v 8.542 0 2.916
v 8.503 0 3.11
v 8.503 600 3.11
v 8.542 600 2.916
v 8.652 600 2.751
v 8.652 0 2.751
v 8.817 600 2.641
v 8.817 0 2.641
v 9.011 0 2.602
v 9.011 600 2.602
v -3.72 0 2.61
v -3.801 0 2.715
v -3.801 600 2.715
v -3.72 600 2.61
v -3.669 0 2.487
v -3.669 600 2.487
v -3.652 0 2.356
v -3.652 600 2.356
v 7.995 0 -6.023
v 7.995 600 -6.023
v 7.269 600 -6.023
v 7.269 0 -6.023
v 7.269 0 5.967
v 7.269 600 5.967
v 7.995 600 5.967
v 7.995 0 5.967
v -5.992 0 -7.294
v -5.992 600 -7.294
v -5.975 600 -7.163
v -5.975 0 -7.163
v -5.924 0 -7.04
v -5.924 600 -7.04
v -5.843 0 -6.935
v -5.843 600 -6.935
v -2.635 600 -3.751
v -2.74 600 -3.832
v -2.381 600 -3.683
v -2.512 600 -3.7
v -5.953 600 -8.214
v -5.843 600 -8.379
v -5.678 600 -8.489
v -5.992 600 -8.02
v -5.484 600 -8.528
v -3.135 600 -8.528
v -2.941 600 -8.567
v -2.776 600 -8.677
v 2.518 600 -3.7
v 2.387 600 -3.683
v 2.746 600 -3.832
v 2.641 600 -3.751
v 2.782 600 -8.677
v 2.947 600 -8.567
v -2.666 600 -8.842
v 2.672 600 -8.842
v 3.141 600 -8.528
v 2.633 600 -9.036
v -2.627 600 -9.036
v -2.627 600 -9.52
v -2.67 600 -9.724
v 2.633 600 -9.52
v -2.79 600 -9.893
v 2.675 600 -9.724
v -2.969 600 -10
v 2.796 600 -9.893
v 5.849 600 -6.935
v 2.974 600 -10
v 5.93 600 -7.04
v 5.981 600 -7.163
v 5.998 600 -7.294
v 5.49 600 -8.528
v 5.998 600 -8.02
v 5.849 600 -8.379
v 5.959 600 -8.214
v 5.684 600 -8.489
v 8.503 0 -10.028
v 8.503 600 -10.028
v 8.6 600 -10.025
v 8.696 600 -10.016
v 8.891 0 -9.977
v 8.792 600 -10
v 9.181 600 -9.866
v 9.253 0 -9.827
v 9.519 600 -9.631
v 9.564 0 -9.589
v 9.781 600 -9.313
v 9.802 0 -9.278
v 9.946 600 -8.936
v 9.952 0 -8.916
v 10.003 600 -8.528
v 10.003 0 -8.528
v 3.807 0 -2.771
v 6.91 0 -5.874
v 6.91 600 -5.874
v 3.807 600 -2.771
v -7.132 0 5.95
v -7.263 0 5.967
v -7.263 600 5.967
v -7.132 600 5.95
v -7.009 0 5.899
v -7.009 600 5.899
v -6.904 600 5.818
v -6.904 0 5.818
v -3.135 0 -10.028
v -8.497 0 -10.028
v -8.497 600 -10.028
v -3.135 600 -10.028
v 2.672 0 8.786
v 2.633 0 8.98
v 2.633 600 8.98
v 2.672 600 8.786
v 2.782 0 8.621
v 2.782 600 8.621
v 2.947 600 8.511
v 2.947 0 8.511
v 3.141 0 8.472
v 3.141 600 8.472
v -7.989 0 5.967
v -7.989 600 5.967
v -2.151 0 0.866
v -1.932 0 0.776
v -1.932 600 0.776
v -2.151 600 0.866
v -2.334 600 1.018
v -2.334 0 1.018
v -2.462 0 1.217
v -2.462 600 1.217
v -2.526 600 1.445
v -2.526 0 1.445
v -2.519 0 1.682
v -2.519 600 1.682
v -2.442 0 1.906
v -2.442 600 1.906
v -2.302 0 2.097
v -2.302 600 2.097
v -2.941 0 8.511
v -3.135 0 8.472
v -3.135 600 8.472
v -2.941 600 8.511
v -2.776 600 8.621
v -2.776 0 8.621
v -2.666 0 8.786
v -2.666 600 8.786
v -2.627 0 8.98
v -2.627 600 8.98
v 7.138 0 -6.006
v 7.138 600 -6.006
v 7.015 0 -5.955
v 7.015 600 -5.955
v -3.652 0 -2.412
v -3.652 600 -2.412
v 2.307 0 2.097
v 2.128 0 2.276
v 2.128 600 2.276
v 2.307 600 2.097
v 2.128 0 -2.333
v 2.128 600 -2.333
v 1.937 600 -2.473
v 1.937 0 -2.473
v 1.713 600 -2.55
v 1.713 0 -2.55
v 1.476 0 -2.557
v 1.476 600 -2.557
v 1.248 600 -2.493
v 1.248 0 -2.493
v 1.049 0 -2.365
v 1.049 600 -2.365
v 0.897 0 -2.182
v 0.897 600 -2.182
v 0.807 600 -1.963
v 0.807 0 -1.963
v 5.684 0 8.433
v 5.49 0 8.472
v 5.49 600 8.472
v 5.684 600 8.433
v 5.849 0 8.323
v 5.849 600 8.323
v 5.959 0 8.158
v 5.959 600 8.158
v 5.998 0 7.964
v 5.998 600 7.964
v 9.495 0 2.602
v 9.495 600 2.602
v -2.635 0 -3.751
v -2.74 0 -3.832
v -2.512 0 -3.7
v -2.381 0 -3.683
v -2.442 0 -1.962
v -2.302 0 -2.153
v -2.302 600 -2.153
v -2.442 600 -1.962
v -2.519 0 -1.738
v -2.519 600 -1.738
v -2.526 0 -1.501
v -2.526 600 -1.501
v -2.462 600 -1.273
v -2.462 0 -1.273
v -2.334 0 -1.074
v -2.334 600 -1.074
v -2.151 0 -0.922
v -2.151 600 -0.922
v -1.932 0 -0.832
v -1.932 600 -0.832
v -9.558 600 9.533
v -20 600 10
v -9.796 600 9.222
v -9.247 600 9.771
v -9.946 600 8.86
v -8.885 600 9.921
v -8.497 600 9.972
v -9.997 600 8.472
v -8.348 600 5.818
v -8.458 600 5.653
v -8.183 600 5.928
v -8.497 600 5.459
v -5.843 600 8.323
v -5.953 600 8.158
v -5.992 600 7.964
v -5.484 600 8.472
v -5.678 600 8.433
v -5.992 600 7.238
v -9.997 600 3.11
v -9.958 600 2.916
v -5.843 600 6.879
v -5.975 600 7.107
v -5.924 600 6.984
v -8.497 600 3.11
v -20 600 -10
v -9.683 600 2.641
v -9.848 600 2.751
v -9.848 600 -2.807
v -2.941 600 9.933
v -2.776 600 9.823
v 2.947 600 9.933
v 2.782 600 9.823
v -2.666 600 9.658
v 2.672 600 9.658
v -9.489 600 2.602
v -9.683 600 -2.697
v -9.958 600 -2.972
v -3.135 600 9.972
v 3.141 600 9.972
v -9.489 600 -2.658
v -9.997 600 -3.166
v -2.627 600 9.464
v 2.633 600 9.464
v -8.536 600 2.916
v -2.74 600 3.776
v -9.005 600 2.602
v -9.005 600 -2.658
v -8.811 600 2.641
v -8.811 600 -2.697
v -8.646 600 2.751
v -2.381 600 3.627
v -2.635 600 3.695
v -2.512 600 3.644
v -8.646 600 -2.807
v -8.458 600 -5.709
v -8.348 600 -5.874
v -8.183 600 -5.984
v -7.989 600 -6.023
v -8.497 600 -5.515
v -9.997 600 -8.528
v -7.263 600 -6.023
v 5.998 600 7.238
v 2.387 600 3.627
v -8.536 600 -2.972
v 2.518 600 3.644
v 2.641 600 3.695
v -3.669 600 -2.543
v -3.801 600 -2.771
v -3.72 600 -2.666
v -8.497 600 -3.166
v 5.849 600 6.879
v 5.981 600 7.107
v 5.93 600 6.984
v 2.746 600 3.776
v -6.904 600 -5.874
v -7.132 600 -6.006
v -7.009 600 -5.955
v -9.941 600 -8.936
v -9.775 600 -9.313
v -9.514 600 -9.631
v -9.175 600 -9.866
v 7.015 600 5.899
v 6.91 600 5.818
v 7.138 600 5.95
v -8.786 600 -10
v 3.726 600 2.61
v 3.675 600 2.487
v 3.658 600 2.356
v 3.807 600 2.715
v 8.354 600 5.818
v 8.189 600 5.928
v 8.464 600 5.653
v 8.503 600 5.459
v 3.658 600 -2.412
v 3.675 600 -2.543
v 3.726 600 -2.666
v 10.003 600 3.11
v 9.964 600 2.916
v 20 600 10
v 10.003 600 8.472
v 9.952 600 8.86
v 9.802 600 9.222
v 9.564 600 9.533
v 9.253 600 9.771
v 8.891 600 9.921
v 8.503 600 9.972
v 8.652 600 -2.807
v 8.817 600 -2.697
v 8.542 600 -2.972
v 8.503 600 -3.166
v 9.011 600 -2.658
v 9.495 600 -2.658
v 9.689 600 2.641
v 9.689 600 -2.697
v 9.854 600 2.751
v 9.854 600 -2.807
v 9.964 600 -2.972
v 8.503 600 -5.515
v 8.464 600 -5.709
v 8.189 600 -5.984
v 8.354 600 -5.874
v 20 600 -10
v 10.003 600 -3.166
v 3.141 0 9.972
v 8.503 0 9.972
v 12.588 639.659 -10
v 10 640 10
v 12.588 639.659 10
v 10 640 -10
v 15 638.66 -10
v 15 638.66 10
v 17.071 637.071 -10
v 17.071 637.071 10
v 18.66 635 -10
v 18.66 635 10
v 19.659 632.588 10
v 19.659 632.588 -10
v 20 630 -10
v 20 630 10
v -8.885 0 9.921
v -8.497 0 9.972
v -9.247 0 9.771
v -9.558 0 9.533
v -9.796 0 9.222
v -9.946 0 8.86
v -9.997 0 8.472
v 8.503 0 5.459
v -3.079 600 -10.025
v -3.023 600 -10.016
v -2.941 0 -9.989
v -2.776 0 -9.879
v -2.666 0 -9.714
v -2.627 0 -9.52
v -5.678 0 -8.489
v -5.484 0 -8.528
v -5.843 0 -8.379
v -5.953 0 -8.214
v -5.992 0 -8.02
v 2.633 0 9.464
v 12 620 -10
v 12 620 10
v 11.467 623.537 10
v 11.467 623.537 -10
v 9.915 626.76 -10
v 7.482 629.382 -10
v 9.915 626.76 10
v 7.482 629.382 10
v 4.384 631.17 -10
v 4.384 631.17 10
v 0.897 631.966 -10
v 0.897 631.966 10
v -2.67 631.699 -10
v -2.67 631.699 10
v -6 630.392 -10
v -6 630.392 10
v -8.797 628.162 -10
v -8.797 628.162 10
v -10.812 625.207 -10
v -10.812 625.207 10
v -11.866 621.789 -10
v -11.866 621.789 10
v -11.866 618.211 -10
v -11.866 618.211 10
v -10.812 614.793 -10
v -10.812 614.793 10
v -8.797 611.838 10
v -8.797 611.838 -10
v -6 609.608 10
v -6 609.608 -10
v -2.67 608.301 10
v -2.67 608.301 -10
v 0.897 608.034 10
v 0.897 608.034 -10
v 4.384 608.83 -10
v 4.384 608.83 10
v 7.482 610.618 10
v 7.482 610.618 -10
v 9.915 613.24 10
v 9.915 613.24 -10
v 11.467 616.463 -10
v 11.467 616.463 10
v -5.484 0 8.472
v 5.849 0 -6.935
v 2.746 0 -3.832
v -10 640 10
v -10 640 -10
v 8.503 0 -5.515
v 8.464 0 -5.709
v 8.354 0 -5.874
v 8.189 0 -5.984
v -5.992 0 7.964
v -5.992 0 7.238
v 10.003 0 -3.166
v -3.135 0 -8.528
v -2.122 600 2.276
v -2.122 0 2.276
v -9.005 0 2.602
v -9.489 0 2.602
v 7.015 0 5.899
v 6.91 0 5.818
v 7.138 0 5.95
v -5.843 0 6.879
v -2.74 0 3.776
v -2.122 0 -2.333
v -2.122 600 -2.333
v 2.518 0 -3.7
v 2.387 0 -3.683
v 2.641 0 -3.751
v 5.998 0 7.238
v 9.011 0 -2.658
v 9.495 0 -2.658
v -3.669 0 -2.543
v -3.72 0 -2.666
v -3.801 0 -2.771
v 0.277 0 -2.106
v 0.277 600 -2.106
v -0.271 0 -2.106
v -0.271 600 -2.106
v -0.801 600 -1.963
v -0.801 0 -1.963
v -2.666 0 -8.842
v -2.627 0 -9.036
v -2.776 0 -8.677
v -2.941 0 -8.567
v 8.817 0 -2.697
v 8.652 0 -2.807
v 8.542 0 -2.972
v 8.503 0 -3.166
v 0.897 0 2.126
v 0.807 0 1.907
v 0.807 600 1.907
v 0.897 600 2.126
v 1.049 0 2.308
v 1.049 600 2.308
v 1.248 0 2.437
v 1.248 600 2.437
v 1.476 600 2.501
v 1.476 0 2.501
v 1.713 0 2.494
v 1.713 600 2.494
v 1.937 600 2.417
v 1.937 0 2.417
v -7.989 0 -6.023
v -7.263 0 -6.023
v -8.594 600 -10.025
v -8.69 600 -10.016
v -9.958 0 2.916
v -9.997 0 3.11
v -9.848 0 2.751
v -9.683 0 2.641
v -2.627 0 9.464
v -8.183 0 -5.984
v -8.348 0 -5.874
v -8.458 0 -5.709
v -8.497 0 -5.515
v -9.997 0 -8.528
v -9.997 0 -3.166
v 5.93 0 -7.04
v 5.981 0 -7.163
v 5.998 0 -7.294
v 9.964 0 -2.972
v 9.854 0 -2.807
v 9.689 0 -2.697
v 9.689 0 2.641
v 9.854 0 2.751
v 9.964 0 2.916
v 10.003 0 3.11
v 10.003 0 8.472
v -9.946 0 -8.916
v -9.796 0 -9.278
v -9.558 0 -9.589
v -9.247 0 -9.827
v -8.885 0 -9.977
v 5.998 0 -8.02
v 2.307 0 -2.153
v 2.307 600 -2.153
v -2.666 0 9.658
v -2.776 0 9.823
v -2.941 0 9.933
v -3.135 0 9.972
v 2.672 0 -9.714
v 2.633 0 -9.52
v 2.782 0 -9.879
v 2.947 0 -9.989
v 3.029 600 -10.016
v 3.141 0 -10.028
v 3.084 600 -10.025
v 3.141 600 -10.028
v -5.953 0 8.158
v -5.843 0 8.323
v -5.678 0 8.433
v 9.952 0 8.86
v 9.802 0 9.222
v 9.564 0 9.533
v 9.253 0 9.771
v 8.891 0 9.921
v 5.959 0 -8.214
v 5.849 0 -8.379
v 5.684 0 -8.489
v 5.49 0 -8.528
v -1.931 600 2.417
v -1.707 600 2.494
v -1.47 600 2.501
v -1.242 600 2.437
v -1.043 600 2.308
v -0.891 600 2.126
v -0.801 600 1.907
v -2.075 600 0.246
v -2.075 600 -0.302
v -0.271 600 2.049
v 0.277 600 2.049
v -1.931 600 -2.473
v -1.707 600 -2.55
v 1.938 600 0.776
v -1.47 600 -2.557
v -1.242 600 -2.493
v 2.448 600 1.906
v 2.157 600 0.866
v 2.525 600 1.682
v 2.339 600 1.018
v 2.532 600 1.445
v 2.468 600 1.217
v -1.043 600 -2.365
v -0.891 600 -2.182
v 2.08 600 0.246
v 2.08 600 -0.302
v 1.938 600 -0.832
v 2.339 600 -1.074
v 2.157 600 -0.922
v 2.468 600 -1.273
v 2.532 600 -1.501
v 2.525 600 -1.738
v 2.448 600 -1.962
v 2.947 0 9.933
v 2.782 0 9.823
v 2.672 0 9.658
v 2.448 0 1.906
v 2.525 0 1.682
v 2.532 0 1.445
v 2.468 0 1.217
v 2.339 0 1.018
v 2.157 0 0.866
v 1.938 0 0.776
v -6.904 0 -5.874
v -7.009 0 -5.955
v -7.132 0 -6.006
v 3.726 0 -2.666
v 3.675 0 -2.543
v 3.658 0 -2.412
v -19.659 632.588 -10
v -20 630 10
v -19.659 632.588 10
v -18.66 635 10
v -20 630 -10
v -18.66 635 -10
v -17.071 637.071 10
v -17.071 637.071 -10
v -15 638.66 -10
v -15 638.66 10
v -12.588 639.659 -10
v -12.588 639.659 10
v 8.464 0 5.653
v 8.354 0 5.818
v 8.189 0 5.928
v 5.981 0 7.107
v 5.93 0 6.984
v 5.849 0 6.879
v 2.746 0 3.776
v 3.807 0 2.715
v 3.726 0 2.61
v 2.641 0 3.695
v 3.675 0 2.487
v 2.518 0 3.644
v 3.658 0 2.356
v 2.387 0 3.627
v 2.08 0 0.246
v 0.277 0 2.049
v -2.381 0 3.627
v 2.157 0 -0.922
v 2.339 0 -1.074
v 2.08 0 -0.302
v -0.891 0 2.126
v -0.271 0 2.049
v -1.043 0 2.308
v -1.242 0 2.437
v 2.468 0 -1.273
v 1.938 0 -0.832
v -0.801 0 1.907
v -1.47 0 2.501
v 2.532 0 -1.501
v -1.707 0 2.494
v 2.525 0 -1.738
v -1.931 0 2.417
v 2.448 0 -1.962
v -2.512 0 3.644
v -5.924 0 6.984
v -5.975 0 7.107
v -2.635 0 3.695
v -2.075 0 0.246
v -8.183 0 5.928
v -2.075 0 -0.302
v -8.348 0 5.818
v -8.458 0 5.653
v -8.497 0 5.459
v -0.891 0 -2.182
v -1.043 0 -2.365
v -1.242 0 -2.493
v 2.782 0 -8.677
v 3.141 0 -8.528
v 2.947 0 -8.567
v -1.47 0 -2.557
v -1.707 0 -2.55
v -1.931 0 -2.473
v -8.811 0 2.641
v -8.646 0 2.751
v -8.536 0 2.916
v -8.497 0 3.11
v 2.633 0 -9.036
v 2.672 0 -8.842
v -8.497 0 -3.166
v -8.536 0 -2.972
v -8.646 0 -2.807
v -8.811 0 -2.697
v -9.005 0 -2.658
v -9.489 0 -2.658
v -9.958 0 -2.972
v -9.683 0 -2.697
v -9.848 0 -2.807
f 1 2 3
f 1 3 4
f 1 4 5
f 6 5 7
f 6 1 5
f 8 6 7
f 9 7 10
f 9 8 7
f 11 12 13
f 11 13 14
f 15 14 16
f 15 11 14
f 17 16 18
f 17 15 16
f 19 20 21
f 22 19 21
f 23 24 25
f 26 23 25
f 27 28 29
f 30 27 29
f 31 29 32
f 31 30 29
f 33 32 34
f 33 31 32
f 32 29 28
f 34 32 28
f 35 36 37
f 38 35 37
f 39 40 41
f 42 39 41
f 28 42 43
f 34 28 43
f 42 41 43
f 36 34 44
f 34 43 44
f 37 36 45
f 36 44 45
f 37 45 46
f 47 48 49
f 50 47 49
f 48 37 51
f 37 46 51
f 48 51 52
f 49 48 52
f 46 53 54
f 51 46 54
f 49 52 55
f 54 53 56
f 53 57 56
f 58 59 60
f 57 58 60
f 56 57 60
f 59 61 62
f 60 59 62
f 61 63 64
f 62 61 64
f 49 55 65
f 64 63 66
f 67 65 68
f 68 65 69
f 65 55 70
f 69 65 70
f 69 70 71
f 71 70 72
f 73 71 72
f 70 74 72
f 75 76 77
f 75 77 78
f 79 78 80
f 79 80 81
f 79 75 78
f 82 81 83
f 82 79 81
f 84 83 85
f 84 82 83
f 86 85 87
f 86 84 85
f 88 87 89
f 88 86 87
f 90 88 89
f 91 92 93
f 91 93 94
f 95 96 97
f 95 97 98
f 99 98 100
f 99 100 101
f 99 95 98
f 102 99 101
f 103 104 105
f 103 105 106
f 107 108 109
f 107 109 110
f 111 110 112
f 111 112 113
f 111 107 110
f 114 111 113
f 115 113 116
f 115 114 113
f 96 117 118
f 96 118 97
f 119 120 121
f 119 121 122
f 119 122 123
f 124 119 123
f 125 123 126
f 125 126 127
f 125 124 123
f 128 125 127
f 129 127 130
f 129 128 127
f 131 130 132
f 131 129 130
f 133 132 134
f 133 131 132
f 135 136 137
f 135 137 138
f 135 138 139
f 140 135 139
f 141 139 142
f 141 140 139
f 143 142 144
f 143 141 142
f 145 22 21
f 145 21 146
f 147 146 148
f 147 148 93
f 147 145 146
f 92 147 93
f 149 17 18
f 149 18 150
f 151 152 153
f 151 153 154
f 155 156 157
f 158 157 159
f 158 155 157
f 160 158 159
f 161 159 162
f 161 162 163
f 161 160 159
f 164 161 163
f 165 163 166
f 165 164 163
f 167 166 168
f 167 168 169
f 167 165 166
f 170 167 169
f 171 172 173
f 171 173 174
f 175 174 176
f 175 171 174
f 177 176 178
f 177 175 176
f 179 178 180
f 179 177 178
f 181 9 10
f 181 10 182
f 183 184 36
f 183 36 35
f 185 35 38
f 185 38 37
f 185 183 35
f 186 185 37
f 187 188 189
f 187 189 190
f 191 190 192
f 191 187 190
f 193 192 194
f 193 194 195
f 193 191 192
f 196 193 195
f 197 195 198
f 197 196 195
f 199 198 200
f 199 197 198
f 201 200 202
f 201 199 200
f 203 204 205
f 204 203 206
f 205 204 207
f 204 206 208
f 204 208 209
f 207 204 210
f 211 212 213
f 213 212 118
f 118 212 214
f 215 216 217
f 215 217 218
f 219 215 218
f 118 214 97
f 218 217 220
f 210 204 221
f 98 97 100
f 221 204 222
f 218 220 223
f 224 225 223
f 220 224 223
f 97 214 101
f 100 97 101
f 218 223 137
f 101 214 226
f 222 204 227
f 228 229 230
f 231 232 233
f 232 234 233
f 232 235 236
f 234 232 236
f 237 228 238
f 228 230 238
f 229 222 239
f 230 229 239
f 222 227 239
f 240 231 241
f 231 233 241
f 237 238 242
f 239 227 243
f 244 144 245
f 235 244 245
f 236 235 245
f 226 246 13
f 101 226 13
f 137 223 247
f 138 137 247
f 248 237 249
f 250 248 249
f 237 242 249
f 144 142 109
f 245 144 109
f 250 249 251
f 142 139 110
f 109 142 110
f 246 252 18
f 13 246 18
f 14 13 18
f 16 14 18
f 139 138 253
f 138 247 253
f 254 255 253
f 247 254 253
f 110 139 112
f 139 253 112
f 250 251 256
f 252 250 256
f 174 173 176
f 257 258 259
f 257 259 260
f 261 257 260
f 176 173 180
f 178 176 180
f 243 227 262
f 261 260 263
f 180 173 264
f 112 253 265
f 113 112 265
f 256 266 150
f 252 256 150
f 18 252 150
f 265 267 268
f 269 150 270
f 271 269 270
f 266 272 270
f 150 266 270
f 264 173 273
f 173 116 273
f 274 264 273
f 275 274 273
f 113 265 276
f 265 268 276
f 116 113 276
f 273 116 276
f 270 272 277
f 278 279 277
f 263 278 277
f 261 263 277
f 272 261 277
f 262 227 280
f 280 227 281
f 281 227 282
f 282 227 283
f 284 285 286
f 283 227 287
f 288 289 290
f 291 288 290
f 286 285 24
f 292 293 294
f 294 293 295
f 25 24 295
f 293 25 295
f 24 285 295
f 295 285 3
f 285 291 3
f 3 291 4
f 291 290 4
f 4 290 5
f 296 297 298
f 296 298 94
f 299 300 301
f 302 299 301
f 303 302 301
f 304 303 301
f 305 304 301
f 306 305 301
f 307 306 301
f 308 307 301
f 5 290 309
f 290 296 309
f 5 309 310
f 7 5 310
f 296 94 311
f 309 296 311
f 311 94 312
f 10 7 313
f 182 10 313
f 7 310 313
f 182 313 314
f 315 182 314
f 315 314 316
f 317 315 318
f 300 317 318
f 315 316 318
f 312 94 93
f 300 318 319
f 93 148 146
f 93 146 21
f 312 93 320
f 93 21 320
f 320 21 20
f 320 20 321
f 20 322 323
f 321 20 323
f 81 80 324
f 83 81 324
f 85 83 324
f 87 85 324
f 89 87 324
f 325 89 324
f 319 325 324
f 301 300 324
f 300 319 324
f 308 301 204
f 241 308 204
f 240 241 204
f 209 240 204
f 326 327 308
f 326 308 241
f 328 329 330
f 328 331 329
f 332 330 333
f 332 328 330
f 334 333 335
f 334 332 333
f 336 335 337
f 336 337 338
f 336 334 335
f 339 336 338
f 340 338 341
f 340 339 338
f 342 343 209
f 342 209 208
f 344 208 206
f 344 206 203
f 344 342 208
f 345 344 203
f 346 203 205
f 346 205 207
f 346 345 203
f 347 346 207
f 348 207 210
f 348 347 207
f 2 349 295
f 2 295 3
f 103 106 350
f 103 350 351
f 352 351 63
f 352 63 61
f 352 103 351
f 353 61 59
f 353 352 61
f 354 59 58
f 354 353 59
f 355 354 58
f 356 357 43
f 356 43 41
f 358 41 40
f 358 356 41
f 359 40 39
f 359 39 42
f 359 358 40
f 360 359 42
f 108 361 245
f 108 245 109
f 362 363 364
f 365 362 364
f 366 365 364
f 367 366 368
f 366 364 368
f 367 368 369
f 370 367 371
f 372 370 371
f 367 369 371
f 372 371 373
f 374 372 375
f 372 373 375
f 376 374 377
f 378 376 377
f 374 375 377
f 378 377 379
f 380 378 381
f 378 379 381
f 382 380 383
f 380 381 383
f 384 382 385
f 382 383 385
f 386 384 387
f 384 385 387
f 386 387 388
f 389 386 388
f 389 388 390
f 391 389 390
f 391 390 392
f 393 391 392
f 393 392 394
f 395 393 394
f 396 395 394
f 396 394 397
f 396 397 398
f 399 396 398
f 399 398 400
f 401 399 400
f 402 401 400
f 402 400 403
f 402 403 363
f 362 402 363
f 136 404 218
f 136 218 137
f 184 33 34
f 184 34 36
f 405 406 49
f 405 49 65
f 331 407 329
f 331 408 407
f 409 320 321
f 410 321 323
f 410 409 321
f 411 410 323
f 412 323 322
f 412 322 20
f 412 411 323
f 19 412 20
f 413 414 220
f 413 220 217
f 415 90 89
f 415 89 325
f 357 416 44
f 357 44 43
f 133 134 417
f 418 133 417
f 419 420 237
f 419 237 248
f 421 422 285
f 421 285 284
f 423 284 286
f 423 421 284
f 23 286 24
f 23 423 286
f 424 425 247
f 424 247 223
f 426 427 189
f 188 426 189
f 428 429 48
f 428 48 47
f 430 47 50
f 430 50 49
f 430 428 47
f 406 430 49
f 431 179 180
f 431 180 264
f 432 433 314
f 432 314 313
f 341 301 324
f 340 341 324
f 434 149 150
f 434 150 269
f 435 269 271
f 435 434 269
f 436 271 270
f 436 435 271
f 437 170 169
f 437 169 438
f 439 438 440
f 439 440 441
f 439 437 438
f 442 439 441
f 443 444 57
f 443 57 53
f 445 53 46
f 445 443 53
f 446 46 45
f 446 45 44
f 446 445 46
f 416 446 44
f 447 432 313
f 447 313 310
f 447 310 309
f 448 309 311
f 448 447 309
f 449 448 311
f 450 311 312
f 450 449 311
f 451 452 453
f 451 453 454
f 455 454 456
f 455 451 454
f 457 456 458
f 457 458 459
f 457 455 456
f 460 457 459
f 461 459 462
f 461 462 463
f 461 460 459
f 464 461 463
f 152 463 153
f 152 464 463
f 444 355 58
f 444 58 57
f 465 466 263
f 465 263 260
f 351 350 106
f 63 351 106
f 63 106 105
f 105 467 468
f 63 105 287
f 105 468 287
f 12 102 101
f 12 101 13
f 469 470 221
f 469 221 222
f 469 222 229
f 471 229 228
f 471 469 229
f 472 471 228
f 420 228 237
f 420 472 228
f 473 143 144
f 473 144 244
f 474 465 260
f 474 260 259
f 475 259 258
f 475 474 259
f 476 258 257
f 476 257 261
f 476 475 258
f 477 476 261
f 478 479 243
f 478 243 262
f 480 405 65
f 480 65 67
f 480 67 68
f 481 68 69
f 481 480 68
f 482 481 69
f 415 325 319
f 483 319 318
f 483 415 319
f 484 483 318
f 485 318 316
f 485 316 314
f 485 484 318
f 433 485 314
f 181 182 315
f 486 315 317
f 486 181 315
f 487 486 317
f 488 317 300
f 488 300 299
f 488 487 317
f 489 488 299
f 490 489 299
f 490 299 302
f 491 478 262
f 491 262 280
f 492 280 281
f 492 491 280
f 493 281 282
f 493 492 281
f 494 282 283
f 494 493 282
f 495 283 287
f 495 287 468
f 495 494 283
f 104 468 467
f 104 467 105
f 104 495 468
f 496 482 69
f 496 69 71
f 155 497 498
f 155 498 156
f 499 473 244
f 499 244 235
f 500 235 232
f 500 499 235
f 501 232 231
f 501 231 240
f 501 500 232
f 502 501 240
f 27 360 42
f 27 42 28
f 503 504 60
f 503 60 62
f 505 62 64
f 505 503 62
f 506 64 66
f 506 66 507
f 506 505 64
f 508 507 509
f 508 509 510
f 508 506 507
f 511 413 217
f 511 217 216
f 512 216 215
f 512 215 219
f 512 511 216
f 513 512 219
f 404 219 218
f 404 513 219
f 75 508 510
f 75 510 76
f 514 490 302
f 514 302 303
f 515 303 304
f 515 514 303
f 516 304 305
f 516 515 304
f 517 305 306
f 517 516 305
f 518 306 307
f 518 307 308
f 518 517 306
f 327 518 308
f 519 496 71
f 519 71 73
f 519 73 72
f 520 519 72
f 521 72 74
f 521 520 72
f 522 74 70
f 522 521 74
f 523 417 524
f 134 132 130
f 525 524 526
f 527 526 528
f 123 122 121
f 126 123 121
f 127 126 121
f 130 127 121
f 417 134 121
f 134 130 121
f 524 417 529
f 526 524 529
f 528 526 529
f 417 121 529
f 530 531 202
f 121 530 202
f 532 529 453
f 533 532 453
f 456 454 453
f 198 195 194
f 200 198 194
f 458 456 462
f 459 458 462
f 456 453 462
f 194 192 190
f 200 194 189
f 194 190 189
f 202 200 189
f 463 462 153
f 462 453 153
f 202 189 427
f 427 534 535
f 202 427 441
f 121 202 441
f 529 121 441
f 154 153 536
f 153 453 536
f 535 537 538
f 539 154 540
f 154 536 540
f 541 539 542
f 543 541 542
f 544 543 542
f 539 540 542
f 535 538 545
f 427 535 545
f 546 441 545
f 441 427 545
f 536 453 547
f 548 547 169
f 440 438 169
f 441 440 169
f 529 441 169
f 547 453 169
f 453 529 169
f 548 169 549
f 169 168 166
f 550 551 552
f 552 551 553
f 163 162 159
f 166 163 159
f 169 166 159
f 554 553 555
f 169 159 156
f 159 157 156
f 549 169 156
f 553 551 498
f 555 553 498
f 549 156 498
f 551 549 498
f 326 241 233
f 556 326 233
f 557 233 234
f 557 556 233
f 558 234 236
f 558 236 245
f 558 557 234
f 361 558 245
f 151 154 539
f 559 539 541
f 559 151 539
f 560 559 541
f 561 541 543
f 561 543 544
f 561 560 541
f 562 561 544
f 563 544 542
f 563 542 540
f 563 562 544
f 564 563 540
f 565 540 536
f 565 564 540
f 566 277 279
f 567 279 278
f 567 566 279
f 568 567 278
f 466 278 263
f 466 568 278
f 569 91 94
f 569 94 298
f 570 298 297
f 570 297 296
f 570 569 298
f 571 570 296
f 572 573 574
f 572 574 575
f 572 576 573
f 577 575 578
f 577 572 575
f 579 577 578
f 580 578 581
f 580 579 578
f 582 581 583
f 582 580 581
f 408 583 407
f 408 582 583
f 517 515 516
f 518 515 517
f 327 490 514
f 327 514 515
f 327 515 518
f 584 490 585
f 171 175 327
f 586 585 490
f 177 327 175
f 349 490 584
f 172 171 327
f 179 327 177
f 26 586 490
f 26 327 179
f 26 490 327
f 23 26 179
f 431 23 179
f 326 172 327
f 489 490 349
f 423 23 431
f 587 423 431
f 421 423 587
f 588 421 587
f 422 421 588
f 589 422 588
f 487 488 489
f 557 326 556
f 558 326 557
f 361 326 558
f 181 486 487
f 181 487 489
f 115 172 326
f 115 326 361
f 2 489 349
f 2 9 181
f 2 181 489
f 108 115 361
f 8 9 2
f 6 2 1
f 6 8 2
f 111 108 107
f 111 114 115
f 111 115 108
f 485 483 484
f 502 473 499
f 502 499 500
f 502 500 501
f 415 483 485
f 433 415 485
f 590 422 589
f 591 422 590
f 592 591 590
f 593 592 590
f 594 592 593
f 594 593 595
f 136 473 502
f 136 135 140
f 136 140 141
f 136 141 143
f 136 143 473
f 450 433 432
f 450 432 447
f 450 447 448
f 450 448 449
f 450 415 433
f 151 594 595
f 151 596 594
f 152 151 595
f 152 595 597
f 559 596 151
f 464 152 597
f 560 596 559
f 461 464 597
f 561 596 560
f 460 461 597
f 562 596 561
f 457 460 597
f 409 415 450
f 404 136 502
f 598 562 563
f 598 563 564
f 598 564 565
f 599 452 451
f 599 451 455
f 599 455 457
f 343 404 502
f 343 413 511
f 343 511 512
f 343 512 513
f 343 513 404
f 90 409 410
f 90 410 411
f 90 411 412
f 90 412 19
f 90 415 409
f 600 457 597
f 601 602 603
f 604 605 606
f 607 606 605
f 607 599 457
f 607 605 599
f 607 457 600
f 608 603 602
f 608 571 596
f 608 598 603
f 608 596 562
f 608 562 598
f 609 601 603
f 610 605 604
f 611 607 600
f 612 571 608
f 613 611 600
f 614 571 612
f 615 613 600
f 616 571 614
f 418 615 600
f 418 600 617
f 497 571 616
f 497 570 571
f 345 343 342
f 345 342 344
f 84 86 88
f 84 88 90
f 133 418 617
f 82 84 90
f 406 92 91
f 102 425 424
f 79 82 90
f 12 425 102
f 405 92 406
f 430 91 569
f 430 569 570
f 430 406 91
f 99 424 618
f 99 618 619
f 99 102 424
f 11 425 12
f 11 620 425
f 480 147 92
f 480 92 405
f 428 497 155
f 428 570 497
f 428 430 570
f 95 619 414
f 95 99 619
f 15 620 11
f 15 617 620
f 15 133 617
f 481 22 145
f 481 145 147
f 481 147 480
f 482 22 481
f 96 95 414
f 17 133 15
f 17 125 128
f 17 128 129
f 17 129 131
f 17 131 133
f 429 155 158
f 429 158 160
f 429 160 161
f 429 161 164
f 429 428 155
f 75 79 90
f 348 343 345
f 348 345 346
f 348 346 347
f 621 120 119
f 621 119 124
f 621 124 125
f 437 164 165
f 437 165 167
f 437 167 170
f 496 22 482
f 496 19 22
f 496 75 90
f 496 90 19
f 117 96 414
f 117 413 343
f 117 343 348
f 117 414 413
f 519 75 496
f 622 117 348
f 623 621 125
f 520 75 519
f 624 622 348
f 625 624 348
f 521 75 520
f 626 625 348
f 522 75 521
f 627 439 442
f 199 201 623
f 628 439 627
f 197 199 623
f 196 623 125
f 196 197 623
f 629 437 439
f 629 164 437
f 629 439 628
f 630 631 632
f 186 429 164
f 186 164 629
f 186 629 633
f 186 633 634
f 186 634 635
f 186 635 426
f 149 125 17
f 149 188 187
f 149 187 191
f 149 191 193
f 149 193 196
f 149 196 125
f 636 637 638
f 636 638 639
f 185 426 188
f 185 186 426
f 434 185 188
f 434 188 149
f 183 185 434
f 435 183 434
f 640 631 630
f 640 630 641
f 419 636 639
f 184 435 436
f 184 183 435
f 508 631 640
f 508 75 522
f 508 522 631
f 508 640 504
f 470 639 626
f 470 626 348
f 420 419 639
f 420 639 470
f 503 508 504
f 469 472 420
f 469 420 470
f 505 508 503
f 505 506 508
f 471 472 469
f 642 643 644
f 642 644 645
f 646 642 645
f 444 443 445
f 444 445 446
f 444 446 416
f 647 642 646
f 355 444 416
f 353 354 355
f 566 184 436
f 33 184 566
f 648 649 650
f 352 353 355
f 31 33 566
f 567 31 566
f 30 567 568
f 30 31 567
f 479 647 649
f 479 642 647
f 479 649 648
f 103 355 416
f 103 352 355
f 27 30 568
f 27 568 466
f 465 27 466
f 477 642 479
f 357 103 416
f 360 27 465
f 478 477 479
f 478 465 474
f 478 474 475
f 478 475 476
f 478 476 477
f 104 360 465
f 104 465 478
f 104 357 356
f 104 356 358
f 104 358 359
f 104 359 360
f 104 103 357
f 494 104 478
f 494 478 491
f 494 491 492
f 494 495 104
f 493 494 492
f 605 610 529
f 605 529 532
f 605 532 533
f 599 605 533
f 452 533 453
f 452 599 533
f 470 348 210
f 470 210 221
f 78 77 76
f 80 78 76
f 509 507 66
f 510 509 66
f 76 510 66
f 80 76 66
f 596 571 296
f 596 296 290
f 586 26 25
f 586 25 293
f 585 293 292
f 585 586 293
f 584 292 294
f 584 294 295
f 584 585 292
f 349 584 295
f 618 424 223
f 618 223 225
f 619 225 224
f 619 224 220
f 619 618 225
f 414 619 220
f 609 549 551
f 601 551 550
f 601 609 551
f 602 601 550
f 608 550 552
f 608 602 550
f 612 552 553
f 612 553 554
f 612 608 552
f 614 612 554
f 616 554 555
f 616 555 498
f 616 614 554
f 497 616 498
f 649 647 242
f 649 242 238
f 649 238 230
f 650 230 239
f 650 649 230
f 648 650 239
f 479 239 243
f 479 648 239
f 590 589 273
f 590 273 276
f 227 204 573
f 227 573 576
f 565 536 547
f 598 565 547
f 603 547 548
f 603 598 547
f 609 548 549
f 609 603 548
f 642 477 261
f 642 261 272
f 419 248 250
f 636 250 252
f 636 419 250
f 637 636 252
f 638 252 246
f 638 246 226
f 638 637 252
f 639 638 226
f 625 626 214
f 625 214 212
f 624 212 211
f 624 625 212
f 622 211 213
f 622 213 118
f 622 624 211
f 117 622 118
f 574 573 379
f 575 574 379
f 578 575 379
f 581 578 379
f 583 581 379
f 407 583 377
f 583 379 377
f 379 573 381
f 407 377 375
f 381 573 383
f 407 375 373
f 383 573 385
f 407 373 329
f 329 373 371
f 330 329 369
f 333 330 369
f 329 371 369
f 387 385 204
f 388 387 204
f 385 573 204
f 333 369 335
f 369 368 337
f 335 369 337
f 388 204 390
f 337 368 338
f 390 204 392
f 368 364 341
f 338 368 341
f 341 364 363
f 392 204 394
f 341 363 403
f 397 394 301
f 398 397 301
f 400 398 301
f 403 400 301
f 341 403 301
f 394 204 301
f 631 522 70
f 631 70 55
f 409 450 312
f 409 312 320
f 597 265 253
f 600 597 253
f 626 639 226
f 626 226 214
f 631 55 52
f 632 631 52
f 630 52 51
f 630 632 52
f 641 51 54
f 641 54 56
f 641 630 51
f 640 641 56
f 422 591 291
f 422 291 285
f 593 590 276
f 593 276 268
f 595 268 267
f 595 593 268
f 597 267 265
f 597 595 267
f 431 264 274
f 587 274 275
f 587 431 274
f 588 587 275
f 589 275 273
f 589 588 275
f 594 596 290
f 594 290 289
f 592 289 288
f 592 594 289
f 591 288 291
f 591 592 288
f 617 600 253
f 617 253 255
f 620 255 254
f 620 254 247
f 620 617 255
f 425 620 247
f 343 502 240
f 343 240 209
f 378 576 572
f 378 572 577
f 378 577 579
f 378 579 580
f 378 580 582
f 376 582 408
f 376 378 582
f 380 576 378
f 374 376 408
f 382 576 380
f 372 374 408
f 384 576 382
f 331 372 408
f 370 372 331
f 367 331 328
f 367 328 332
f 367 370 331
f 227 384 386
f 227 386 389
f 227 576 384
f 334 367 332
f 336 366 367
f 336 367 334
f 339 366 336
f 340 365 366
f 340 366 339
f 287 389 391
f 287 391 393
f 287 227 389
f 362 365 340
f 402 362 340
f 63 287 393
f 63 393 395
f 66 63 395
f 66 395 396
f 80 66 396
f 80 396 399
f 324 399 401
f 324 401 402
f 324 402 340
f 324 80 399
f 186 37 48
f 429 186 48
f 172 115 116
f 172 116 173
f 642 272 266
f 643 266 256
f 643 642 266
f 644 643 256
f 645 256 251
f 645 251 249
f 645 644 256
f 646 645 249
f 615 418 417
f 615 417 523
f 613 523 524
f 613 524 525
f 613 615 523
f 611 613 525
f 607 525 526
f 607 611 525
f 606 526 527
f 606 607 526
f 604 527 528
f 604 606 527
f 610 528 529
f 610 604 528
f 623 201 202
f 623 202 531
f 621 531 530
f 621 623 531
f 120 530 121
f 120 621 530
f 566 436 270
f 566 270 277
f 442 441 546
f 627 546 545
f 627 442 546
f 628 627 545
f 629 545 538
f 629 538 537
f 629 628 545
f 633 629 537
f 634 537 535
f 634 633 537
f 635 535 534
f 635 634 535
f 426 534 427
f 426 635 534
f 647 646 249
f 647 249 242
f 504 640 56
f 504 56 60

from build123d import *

# Parameters (mm, degrees)
BOSS_EXTRUDE1_DEPTH = 600
SKETCH2_W           = 40
SKETCH2_H           = 20
BOSS_EXTRUDE2_DEPTH = 40
FILLET1_R           = 10
SKETCH3_R           = 12
CUT_EXTRUDE1_DEPTH  = 40


with BuildPart() as part:
    # Sketch1 → Boss-Extrude1 (new body)
    with BuildSketch(Plane(origin=(0, 0, 0), x_dir=(1, 0, 0), z_dir=(0, 1, 0))):
        with BuildLine():
            Line((9.494919477, 2.658080263), (9.010919477, 2.658080263))
            ThreePointArc((9.010919477, 2.658080263), (8.651709233, 2.806870018), (8.502919477, 3.166080263))
            Line((8.502919477, 3.166080263), (8.502919477, 5.515080263))
            ThreePointArc((8.502919477, 5.515080263), (8.354129722, 5.874290508), (7.994919477, 6.023080263))
            Line((7.994919477, 6.023080263), (7.269000139, 6.023080263))
            ThreePointArc((7.269000139, 6.023080263), (7.074596955, 5.984411065), (6.909789894, 5.874290508))
            Line((6.909789894, 5.874290508), (3.806709233, 2.771209846))
            ThreePointArc((3.806709233, 2.771209846), (3.696588675, 2.606402785), (3.657919477, 2.411999602))
            Line((3.657919477, 2.411999602), (3.657919477, -2.355839076))
            ThreePointArc((3.657919477, -2.355839076), (3.696588675, -2.550242259), (3.806709233, -2.71504932))
            Line((3.806709233, -2.71504932), (6.909789894, -5.818129982))
            ThreePointArc((6.909789894, -5.818129982), (7.074596955, -5.92825054), (7.269000139, -5.966919737))
            Line((7.269000139, -5.966919737), (7.994919477, -5.966919737))
            ThreePointArc((7.994919477, -5.966919737), (8.354129722, -5.818129982), (8.502919477, -5.458919737))
            Line((8.502919477, -5.458919737), (8.502919477, -3.109919737))
            ThreePointArc((8.502919477, -3.109919737), (8.651709233, -2.750709492), (9.010919477, -2.601919737))
            Line((9.010919477, -2.601919737), (9.494919477, -2.601919737))
            ThreePointArc((9.494919477, -2.601919737), (9.854129722, -2.750709492), (10.002919477, -3.109919737))
            Line((10.002919477, -3.109919737), (10.002919477, -8.471919737))
            ThreePointArc((10.002919477, -8.471919737), (9.563579649, -9.532579909), (8.502919477, -9.971919737))
            Line((8.502919477, -9.971919737), (3.140919477, -9.971919737))
            ThreePointArc((3.140919477, -9.971919737), (2.781709233, -9.823129982), (2.632919477, -9.463919737))
            Line((2.632919477, -9.463919737), (2.632919477, -8.979919737))
            ThreePointArc((2.632919477, -8.979919737), (2.781709233, -8.620709492), (3.140919477, -8.471919737))
            Line((3.140919477, -8.471919737), (5.489919477, -8.471919737))
            ThreePointArc((5.489919477, -8.471919737), (5.849129722, -8.323129982), (5.997919477, -7.963919737))
            Line((5.997919477, -7.963919737), (5.997919477, -7.238000398))
            ThreePointArc((5.997919477, -7.238000398), (5.95925028, -7.043597215), (5.849129722, -6.878790154))
            Line((5.849129722, -6.878790154), (2.746049061, -3.775709492))
            ThreePointArc((2.746049061, -3.775709492), (2.581242, -3.665588935), (2.386838816, -3.626919737))
            Line((2.386838816, -3.626919737), (-2.380999861, -3.626919737))
            ThreePointArc((-2.380999861, -3.626919737), (-2.575403045, -3.665588935), (-2.740210106, -3.775709492))
            Line((-2.740210106, -3.775709492), (-5.843290767, -6.878790154))
            ThreePointArc((-5.843290767, -6.878790154), (-5.953411325, -7.043597215), (-5.992080523, -7.238000398))
            Line((-5.992080523, -7.238000398), (-5.992080523, -7.963919737))
            ThreePointArc((-5.992080523, -7.963919737), (-5.843290767, -8.323129982), (-5.484080523, -8.471919737))
            Line((-5.484080523, -8.471919737), (-3.135080523, -8.471919737))
            ThreePointArc((-3.135080523, -8.471919737), (-2.775870278, -8.620709492), (-2.627080523, -8.979919737))
            Line((-2.627080523, -8.979919737), (-2.627080523, -9.463919737))
            ThreePointArc((-2.627080523, -9.463919737), (-2.775870278, -9.823129982), (-3.135080523, -9.971919737))
            Line((-3.135080523, -9.971919737), (-8.497080523, -9.971919737))
            ThreePointArc((-8.497080523, -9.971919737), (-9.557740694, -9.532579909), (-9.997080523, -8.471919737))
            Line((-9.997080523, -8.471919737), (-9.997080523, -3.109919737))
            ThreePointArc((-9.997080523, -3.109919737), (-9.848290767, -2.750709492), (-9.489080523, -2.601919737))
            Line((-9.489080523, -2.601919737), (-9.005080523, -2.601919737))
            ThreePointArc((-9.005080523, -2.601919737), (-8.645870278, -2.750709492), (-8.497080523, -3.109919737))
            Line((-8.497080523, -3.109919737), (-8.497080523, -5.458919737))
            ThreePointArc((-8.497080523, -5.458919737), (-8.348290767, -5.818129982), (-7.989080523, -5.966919737))
            Line((-7.989080523, -5.966919737), (-7.263161184, -5.966919737))
            ThreePointArc((-7.263161184, -5.966919737), (-7.068758, -5.92825054), (-6.903950939, -5.818129982))
            Line((-6.903950939, -5.818129982), (-3.800870278, -2.71504932))
            ThreePointArc((-3.800870278, -2.71504932), (-3.69074972, -2.550242259), (-3.652080523, -2.355839076))
            Line((-3.652080523, -2.355839076), (-3.652080523, 2.411999602))
            ThreePointArc((-3.652080523, 2.411999602), (-3.69074972, 2.606402785), (-3.800870278, 2.771209846))
            Line((-3.800870278, 2.771209846), (-6.903950939, 5.874290508))
            ThreePointArc((-6.903950939, 5.874290508), (-7.068758, 5.984411065), (-7.263161184, 6.023080263))
            Line((-7.263161184, 6.023080263), (-7.989080523, 6.023080263))
            ThreePointArc((-7.989080523, 6.023080263), (-8.348290767, 5.874290508), (-8.497080523, 5.515080263))
            Line((-8.497080523, 5.515080263), (-8.497080523, 3.166080263))
            ThreePointArc((-8.497080523, 3.166080263), (-8.645870278, 2.806870018), (-9.005080523, 2.658080263))
            Line((-9.005080523, 2.658080263), (-9.489080523, 2.658080263))
            ThreePointArc((-9.489080523, 2.658080263), (-9.848290767, 2.806870018), (-9.997080523, 3.166080263))
            Line((-9.997080523, 3.166080263), (-9.997080523, 8.528080263))
            ThreePointArc((-9.997080523, 8.528080263), (-9.557740694, 9.588740435), (-8.497080523, 10.028080263))
            Line((-8.497080523, 10.028080263), (-3.135080523, 10.028080263))
            ThreePointArc((-3.135080523, 10.028080263), (-2.775870278, 9.879290508), (-2.627080523, 9.520080263))
            Line((-2.627080523, 9.520080263), (-2.627080523, 9.036080263))
            ThreePointArc((-2.627080523, 9.036080263), (-2.775870278, 8.676870018), (-3.135080523, 8.528080263))
            Line((-3.135080523, 8.528080263), (-5.484080523, 8.528080263))
            ThreePointArc((-5.484080523, 8.528080263), (-5.843290767, 8.379290508), (-5.992080523, 8.020080263))
            Line((-5.992080523, 8.020080263), (-5.992080523, 7.294160924))
            ThreePointArc((-5.992080523, 7.294160924), (-5.953411325, 7.099757741), (-5.843290767, 6.93495068))
            Line((-5.843290767, 6.93495068), (-2.740210106, 3.831870018))
            ThreePointArc((-2.740210106, 3.831870018), (-2.575403045, 3.72174946), (-2.380999861, 3.683080263))
            Line((-2.380999861, 3.683080263), (2.386838816, 3.683080263))
            ThreePointArc((2.386838816, 3.683080263), (2.581242, 3.72174946), (2.746049061, 3.831870018))
            Line((2.746049061, 3.831870018), (5.849129722, 6.93495068))
            ThreePointArc((5.849129722, 6.93495068), (5.95925028, 7.099757741), (5.997919477, 7.294160924))
            Line((5.997919477, 7.294160924), (5.997919477, 8.020080263))
            ThreePointArc((5.997919477, 8.020080263), (5.849129722, 8.379290508), (5.489919477, 8.528080263))
            Line((5.489919477, 8.528080263), (3.140919477, 8.528080263))
            ThreePointArc((3.140919477, 8.528080263), (2.781709233, 8.676870018), (2.632919477, 9.036080263))
            Line((2.632919477, 9.036080263), (2.632919477, 9.520080263))
            ThreePointArc((2.632919477, 9.520080263), (2.781709233, 9.879290508), (3.140919477, 10.028080263))
            Line((3.140919477, 10.028080263), (8.502919477, 10.028080263))
            ThreePointArc((8.502919477, 10.028080263), (9.563579649, 9.588740435), (10.002919477, 8.528080263))
            Line((10.002919477, 8.528080263), (10.002919477, 3.166080263))
            ThreePointArc((10.002919477, 3.166080263), (9.854129722, 2.806870018), (9.494919477, 2.658080263))
        make_face()
        with BuildLine():
            Line((2.127820321, -2.276425703), (2.307425444, -2.096820581))
            ThreePointArc((2.307425444, -2.096820581), (2.508857494, -1.328387548), (1.938052984, -0.775896455))
            ThreePointArc((1.938052984, -0.775896455), (2.098419477, 0.028080263), (1.938052984, 0.832056981))
            ThreePointArc((1.938052984, 0.832056981), (2.508857494, 1.384548074), (2.307425444, 2.152981107))
            Line((2.307425444, 2.152981107), (2.127820321, 2.332586229))
            ThreePointArc((2.127820321, 2.332586229), (1.359387288, 2.53401828), (0.806896195, 1.963213769))
            ThreePointArc((0.806896195, 1.963213769), (0.002919477, 2.123580263), (-0.801057241, 1.963213769))
            ThreePointArc((-0.801057241, 1.963213769), (-1.353548333, 2.53401828), (-2.121981366, 2.332586229))
            Line((-2.121981366, 2.332586229), (-2.301586489, 2.152981107))
            ThreePointArc((-2.301586489, 2.152981107), (-2.503018539, 1.384548074), (-1.932214029, 0.832056981))
            ThreePointArc((-1.932214029, 0.832056981), (-2.092580523, 0.028080263), (-1.932214029, -0.775896455))
            ThreePointArc((-1.932214029, -0.775896455), (-2.503018539, -1.328387548), (-2.301586489, -2.096820581))
            Line((-2.301586489, -2.096820581), (-2.121981366, -2.276425703))
            ThreePointArc((-2.121981366, -2.276425703), (-1.353548333, -2.477857754), (-0.801057241, -1.907053243))
            ThreePointArc((-0.801057241, -1.907053243), (0.002919477, -2.067419737), (0.806896195, -1.907053243))
            ThreePointArc((0.806896195, -1.907053243), (1.359387288, -2.477857754), (2.127820321, -2.276425703))
        make_face(mode=Mode.SUBTRACT)
    extrude(amount=BOSS_EXTRUDE1_DEPTH)

    # Sketch2 → Boss-Extrude2 (add)
    with BuildSketch(Plane(origin=(0, 600, 0), x_dir=(1, 0, 0), z_dir=(0, 1, 0))):
        Rectangle(SKETCH2_W, SKETCH2_H)
    extrude(amount=BOSS_EXTRUDE2_DEPTH)

    # Fillet1
    fillet1_edges = [part.edges().sort_by_distance(p)[0] for p in [
        (20, 640, 0),
        (-20, 640, 0),
    ]]
    fillet(fillet1_edges, radius=FILLET1_R)

    # Sketch3 → Cut-Extrude1 (cut)
    with BuildSketch(Plane.XY.offset(10)):
        with Locations((0, 620)):
            Circle(SKETCH3_R)
    extrude(amount=-CUT_EXTRUDE1_DEPTH, mode=Mode.SUBTRACT)


solid = part.part
